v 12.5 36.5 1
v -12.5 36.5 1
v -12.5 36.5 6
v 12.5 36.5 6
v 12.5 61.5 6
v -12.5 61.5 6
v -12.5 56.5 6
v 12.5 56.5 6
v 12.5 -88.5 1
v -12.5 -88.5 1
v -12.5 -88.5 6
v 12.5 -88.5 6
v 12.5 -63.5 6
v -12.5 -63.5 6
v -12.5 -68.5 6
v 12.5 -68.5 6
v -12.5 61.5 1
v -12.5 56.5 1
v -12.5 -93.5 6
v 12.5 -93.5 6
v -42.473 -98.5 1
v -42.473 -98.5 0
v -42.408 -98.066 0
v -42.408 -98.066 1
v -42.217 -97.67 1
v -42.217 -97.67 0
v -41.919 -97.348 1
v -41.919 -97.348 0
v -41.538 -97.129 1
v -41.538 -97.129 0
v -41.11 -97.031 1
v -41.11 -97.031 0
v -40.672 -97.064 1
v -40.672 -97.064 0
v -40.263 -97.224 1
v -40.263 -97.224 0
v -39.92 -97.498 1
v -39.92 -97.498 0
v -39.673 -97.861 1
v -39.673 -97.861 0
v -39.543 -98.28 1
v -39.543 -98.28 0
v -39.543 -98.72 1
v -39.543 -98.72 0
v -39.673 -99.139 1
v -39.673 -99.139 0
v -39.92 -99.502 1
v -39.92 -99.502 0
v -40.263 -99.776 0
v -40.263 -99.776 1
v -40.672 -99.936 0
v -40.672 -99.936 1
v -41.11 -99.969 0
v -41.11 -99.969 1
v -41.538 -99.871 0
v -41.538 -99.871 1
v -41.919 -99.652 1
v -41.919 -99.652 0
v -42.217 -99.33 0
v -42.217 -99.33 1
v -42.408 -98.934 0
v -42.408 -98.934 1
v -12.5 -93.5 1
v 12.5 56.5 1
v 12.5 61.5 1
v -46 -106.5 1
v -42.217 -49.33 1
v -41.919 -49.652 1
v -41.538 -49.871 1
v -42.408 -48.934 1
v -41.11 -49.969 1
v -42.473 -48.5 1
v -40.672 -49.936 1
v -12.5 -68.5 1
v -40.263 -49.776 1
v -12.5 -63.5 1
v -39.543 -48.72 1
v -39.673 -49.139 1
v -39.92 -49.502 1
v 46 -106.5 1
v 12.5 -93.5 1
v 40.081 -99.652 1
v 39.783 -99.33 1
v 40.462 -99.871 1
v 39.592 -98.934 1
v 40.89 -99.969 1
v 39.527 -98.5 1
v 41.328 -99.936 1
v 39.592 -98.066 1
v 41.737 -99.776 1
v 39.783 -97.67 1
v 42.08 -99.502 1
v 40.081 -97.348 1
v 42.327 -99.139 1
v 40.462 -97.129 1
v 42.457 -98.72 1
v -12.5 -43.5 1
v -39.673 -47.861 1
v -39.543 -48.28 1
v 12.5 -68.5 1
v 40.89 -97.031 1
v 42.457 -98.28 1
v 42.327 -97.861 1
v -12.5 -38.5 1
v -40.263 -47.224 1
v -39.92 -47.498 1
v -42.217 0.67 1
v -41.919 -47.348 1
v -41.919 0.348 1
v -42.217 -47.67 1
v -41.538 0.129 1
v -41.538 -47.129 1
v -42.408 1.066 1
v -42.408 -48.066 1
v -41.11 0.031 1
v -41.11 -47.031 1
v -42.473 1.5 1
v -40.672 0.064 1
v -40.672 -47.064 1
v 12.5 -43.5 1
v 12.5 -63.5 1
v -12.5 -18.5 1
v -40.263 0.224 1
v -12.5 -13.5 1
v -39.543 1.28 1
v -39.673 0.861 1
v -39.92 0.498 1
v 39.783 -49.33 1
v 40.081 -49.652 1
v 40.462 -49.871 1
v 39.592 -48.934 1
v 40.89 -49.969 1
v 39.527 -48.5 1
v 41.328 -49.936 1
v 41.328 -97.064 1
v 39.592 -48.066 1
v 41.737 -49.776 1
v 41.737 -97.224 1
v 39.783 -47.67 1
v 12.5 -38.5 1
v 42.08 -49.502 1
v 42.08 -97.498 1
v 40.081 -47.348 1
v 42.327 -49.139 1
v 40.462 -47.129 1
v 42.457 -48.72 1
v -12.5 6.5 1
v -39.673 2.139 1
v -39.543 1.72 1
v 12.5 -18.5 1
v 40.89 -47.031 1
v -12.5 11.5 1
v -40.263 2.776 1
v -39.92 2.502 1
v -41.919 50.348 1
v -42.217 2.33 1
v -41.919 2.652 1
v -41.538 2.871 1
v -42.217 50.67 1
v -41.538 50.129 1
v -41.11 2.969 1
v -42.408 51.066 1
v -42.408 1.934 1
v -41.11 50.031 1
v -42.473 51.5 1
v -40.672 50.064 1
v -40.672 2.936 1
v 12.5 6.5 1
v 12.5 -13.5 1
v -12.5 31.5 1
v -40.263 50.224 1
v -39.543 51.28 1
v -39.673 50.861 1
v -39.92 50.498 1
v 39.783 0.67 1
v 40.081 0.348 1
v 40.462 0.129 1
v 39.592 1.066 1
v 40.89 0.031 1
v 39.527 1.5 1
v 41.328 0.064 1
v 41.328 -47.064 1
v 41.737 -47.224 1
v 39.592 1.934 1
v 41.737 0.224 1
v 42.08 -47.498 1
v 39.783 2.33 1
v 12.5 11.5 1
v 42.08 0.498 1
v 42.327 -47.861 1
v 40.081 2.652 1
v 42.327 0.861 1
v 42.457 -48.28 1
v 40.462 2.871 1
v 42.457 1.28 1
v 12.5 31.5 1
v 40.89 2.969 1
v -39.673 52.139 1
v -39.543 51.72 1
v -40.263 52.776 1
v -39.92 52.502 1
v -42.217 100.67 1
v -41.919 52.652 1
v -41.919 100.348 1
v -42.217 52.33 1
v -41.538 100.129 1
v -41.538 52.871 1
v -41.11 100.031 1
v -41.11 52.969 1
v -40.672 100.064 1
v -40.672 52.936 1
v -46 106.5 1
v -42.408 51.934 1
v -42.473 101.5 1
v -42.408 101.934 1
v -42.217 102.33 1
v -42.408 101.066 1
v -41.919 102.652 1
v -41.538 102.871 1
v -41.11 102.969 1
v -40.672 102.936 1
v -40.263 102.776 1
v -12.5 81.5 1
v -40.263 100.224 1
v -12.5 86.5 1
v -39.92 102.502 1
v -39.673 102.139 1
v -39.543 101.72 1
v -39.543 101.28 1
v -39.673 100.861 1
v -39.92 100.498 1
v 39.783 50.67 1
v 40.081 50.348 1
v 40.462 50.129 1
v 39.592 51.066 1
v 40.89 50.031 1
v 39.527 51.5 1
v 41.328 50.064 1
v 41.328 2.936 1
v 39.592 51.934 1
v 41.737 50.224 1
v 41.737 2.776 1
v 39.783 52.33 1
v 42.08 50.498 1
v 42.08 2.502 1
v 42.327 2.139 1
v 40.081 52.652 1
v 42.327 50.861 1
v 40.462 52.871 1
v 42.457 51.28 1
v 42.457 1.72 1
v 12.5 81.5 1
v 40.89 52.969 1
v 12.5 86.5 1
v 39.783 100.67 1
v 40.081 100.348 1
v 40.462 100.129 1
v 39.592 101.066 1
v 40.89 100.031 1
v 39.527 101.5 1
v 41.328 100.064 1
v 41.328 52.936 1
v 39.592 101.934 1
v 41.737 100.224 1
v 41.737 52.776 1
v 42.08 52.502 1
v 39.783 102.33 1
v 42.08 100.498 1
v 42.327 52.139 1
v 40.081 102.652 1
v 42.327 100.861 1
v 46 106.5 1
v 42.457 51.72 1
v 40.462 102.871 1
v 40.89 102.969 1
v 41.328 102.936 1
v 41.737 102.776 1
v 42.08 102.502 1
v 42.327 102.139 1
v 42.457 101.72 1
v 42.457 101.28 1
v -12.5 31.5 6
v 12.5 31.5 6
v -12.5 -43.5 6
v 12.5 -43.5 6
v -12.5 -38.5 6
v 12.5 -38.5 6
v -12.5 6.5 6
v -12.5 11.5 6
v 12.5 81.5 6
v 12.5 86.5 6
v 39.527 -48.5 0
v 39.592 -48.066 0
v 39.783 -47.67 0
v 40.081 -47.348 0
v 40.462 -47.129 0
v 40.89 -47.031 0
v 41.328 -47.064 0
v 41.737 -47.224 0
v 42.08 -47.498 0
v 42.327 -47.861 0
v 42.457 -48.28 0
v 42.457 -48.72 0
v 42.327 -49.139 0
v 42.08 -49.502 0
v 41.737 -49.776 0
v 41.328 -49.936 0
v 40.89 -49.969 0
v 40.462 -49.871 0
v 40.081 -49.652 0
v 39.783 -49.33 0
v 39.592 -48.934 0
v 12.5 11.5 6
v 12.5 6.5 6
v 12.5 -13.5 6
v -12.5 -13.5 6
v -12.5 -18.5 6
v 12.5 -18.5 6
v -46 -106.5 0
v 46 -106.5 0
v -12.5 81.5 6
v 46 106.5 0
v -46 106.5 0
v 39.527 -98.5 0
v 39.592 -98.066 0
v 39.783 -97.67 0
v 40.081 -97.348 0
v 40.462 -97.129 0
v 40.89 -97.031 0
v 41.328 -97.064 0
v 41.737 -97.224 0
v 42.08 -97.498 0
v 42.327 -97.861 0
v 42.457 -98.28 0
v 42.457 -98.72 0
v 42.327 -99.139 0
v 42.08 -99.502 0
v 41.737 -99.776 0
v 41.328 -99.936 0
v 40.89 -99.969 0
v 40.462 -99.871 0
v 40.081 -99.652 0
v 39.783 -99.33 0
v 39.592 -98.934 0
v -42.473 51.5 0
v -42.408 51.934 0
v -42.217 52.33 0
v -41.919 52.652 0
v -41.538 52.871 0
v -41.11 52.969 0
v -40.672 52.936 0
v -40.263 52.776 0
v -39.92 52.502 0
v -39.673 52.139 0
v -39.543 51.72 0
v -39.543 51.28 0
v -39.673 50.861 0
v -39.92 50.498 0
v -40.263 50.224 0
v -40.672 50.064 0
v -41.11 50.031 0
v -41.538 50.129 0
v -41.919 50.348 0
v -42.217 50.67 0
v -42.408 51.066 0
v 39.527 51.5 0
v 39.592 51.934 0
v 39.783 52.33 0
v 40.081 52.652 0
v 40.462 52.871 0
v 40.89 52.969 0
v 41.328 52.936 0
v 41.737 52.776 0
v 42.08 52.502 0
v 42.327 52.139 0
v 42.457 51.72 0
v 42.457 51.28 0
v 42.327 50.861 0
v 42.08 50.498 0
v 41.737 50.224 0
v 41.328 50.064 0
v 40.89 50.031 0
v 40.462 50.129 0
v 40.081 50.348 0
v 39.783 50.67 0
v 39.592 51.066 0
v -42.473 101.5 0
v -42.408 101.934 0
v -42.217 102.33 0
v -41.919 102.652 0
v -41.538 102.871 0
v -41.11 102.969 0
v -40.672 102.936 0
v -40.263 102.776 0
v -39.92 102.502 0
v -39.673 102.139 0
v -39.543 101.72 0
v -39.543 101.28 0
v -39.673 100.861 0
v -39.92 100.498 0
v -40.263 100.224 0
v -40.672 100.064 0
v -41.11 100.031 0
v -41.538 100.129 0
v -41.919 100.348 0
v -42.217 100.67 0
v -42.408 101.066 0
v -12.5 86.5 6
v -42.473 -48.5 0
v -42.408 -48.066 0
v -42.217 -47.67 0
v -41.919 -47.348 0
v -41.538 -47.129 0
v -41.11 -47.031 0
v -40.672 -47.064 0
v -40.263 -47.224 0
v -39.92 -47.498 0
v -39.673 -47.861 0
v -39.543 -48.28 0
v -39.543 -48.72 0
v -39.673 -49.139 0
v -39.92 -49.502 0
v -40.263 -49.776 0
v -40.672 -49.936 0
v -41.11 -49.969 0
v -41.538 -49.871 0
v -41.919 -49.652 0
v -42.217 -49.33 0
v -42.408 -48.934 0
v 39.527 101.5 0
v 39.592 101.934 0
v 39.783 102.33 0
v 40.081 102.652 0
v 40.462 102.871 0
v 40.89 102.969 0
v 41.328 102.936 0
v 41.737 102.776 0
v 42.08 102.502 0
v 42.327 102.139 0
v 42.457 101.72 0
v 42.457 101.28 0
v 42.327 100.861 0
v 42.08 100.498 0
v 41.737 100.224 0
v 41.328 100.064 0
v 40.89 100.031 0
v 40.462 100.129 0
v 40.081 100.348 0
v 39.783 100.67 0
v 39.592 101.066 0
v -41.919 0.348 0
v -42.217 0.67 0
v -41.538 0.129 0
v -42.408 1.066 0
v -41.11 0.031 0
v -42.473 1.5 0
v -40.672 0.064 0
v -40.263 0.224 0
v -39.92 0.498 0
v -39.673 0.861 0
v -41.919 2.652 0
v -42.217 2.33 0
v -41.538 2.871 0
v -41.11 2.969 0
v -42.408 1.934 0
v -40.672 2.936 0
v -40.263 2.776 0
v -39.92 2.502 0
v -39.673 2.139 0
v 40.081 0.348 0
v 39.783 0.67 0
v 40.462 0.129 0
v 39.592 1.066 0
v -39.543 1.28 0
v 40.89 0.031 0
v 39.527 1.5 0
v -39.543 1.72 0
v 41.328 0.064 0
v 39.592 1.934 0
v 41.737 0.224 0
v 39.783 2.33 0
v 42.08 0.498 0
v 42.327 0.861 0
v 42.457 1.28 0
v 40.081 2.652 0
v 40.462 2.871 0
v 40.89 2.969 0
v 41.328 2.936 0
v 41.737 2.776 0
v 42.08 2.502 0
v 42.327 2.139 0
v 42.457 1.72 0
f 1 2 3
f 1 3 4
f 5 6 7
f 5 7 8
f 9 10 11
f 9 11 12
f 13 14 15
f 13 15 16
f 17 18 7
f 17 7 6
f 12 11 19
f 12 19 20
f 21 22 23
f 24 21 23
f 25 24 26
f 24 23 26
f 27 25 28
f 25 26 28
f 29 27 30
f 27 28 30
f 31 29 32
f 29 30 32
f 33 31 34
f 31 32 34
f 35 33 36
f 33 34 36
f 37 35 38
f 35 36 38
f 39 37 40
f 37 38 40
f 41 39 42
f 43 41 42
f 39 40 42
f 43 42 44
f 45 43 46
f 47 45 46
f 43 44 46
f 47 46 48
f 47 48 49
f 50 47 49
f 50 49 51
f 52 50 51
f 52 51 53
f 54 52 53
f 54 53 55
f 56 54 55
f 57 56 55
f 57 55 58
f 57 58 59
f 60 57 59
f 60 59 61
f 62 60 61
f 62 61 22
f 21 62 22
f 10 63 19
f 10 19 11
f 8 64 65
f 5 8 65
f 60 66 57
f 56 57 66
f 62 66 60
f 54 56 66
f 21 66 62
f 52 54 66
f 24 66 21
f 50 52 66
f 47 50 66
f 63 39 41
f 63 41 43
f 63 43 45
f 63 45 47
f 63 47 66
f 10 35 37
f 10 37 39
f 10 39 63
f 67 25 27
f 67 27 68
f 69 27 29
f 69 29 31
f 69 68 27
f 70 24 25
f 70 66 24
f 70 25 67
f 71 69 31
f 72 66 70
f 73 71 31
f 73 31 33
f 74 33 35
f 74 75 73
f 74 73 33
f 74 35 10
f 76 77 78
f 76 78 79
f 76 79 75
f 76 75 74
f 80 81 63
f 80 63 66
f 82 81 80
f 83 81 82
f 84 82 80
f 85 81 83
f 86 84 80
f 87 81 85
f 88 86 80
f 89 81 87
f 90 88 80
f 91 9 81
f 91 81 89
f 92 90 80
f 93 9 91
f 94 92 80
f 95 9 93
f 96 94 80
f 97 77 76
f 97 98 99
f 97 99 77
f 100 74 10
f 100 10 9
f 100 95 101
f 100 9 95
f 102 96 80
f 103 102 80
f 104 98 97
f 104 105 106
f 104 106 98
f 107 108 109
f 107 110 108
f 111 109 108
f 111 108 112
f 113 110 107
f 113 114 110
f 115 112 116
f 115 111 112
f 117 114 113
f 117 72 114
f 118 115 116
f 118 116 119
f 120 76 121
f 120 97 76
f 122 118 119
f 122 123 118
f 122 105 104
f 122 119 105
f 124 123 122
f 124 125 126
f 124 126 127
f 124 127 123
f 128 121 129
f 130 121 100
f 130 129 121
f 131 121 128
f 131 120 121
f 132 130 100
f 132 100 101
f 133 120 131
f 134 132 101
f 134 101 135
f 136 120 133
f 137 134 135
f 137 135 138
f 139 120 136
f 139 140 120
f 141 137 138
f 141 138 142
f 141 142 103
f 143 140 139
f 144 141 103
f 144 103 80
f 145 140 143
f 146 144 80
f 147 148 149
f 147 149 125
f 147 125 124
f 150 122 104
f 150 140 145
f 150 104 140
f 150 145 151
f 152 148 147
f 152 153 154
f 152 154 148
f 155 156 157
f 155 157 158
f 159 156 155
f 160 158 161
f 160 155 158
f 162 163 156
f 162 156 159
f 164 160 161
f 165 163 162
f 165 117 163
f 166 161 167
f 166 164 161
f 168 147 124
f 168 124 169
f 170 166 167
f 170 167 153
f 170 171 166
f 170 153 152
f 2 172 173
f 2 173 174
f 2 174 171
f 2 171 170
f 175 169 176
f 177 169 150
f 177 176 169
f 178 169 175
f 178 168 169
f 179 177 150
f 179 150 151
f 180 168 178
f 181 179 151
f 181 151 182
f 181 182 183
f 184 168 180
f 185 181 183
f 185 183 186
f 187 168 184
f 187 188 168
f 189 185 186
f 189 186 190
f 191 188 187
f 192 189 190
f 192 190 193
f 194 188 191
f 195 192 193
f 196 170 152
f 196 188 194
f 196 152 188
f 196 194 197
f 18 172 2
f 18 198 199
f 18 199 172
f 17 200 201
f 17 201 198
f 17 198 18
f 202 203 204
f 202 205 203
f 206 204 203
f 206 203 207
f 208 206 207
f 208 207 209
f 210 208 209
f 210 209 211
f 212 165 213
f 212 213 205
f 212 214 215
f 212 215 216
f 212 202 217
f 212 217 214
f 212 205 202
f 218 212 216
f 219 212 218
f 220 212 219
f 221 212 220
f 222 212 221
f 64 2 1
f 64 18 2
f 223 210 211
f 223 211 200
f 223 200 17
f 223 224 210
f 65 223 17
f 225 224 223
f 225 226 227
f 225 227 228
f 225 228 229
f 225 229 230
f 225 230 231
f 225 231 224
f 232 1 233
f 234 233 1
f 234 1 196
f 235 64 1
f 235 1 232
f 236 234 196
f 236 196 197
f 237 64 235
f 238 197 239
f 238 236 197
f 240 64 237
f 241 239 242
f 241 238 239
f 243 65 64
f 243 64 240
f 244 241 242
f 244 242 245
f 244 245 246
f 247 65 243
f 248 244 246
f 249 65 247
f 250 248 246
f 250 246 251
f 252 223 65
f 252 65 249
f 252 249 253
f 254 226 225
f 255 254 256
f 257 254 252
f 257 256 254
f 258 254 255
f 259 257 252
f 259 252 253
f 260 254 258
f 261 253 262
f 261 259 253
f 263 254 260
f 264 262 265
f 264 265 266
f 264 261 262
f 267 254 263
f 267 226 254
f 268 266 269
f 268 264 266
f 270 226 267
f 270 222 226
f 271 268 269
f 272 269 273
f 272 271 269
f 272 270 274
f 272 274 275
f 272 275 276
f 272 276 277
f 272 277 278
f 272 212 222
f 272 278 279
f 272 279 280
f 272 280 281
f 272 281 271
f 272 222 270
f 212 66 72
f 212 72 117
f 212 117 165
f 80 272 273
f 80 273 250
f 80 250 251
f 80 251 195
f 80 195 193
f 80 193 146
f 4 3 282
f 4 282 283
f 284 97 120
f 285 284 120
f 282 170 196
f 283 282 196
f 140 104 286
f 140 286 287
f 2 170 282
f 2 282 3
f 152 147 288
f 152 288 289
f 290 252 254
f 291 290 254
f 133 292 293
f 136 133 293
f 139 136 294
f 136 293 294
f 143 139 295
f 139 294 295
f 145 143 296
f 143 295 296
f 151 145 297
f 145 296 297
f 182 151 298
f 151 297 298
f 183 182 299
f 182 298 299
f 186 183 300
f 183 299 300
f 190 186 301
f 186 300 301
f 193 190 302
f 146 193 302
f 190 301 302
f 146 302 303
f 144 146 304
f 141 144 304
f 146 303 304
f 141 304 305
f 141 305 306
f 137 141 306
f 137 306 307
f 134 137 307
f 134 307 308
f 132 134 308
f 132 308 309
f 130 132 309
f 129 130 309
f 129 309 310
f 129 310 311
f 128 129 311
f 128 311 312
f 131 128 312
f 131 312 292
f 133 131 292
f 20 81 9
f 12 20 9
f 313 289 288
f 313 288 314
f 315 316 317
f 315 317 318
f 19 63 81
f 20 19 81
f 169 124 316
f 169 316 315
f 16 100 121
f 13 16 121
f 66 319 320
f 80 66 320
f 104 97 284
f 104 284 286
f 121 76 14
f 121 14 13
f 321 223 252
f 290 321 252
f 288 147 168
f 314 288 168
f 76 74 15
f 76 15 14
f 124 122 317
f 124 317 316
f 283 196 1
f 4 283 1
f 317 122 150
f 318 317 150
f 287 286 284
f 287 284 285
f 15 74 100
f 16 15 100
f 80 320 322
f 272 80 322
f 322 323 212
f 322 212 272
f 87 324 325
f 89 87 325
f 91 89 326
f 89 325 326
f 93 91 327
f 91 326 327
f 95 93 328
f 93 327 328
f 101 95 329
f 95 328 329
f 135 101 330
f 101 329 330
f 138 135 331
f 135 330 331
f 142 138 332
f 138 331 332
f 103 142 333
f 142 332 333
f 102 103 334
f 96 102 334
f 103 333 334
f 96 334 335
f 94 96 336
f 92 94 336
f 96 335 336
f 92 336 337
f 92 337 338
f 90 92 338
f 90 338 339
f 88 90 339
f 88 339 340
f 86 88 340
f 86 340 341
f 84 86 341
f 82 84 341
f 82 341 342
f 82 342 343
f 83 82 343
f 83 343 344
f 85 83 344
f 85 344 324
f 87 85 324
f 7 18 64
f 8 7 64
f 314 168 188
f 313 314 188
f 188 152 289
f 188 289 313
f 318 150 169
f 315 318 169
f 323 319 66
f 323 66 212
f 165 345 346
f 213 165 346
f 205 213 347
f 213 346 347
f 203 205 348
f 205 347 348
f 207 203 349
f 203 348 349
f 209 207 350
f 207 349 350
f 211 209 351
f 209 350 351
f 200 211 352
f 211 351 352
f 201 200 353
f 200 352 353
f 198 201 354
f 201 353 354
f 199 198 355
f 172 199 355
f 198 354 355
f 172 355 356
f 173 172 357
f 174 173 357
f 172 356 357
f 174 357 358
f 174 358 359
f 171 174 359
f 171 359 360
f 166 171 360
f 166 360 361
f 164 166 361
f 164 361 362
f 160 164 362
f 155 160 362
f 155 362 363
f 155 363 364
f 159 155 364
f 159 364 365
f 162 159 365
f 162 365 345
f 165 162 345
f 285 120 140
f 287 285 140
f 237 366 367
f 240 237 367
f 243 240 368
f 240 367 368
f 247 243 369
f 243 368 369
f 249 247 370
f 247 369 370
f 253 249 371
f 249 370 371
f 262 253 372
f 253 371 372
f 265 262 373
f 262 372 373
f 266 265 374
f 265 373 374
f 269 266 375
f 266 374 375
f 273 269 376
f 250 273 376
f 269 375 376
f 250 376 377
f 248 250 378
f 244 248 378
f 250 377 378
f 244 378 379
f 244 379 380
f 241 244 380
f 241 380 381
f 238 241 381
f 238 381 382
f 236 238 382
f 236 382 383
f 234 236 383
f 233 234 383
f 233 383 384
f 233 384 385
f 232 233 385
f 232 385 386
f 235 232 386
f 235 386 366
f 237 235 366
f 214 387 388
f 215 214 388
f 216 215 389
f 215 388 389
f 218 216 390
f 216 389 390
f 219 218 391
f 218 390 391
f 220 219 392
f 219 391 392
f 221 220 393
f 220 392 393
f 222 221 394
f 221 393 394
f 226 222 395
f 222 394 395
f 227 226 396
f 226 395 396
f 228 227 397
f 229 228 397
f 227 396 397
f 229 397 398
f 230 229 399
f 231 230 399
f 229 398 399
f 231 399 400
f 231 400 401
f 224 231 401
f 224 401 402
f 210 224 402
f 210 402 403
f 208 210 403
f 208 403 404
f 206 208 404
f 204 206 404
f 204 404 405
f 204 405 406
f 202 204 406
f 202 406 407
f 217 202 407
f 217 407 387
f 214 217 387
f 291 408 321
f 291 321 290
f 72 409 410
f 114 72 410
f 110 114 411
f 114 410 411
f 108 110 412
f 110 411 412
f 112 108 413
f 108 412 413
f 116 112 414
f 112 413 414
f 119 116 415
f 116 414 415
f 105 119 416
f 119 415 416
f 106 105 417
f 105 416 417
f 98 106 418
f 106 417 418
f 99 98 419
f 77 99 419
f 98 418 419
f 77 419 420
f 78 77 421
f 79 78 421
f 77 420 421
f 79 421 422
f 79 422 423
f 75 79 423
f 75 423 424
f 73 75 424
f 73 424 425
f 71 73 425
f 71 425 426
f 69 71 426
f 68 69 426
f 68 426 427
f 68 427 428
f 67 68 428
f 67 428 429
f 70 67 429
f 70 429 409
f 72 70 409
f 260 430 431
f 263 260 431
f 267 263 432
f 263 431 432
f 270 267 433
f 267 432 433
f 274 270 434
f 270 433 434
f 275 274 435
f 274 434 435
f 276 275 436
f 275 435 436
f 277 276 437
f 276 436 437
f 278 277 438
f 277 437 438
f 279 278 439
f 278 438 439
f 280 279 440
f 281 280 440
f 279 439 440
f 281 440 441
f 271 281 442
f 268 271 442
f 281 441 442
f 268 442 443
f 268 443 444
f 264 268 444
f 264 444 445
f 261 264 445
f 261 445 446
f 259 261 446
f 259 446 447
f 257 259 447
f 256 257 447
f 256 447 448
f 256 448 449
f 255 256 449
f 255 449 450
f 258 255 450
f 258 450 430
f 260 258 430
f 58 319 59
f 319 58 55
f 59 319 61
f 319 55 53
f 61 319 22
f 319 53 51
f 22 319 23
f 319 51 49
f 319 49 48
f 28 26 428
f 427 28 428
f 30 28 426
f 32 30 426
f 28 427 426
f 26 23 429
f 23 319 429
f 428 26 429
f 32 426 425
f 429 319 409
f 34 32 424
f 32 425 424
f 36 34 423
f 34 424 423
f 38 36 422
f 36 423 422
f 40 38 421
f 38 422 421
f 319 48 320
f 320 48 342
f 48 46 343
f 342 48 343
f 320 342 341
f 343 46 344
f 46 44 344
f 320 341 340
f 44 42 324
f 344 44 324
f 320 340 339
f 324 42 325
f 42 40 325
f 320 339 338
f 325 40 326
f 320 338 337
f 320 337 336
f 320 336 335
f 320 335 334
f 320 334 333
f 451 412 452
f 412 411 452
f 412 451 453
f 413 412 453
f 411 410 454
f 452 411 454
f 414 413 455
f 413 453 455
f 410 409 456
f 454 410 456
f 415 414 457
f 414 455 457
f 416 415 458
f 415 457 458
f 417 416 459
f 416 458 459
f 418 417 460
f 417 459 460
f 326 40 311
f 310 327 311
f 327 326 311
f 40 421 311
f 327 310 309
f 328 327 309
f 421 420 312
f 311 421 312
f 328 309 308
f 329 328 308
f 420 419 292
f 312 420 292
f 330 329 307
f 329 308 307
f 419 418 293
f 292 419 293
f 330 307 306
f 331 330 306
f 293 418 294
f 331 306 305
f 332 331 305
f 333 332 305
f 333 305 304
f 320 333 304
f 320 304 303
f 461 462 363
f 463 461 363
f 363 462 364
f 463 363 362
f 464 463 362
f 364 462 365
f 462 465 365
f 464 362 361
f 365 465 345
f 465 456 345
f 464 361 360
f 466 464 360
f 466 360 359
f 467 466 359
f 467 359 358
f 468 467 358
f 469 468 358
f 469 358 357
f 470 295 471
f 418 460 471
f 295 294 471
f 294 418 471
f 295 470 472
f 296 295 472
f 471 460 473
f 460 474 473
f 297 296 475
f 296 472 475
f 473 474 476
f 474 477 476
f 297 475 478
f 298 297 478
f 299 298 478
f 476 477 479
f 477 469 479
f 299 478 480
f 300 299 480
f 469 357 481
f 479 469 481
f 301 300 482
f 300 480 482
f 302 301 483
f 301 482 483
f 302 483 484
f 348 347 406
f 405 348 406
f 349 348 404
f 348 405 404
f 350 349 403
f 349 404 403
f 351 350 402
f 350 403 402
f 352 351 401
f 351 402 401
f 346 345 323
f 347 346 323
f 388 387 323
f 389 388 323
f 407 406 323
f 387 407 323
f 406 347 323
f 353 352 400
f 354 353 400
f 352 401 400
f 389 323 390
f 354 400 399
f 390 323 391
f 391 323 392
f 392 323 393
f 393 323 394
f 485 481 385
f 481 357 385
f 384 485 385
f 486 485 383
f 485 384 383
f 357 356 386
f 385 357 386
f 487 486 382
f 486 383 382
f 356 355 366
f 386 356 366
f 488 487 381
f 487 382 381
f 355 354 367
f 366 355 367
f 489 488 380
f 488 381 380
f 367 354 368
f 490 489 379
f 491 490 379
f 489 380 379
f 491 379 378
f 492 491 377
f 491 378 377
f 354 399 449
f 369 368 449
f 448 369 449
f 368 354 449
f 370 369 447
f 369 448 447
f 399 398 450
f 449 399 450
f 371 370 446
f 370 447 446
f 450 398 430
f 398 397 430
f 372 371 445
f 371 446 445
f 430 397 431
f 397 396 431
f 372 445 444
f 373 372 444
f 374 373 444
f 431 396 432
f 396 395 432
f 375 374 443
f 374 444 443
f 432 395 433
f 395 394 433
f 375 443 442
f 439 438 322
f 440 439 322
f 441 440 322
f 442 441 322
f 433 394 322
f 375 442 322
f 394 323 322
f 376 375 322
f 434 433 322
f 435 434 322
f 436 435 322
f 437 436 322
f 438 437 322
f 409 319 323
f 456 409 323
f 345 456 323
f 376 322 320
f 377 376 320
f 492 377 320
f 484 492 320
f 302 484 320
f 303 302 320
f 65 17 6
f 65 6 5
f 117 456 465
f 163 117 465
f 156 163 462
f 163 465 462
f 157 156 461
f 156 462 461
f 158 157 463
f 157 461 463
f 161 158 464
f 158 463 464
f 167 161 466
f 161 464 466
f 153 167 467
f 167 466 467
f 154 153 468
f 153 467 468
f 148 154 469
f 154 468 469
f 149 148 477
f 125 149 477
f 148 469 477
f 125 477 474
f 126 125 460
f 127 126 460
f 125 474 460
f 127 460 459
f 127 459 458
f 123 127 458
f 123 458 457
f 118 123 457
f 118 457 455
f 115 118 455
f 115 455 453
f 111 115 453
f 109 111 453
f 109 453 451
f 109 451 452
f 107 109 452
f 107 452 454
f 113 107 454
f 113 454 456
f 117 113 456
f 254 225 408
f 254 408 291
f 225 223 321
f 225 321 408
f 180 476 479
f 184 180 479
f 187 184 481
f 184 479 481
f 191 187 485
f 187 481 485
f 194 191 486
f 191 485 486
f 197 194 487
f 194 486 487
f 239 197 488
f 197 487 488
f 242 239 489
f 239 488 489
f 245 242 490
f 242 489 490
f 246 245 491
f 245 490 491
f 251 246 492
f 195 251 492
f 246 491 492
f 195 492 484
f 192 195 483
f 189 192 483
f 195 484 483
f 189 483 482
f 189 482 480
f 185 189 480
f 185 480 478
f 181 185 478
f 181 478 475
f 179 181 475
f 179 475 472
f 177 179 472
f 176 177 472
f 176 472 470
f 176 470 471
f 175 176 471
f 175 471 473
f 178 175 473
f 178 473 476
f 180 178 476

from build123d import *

# Parameters (mm, degrees)
SKETCH1_W                 = 92
SKETCH1_H                 = 213
BOSS_EXTRUDE1_DEPTH       = 1
SKETCH2_W                 = 25
SKETCH2_H                 = 5
BOSS_EXTRUDE2_DEPTH       = 5
F_4_CLEARANCE_HOLE1_D     = 2.9464
F_4_CLEARANCE_HOLE1_DEPTH = 3.175
F_4_CLEARANCE_HOLE1_TIP   = 0.885187864


with BuildPart() as part:
    # Sketch1 → Boss-Extrude1 (new body)
    with BuildSketch(Plane.XY):
        Rectangle(SKETCH1_W, SKETCH1_H)
    extrude(amount=BOSS_EXTRUDE1_DEPTH)

    # Sketch2 → Boss-Extrude2 (add)
    with BuildSketch(Plane.XY.offset(1)):
        with Locations((0, 84)):
            Rectangle(SKETCH2_W, SKETCH2_H)
        with Locations((0, 59)):
            Rectangle(SKETCH2_W, SKETCH2_H)
        with Locations((0, 34)):
            Rectangle(SKETCH2_W, SKETCH2_H)
        with Locations((0, 9)):
            Rectangle(SKETCH2_W, SKETCH2_H)
        with Locations((0, -16)):
            Rectangle(SKETCH2_W, SKETCH2_H)
        with Locations((0, -41)):
            Rectangle(SKETCH2_W, SKETCH2_H)
        with Locations((0, -66)):
            Rectangle(SKETCH2_W, SKETCH2_H)
        with Locations((0, -91)):
            Rectangle(SKETCH2_W, SKETCH2_H)
    extrude(amount=BOSS_EXTRUDE2_DEPTH)

    # #4 Clearance Hole1
    with Locations(Plane.XY.offset(1)):
        with Locations((-41, 101.5), (41, 101.5), (-41, 51.5), (41, 51.5), (-41, 1.5), (41, 1.5), (-41, -48.5), (41, -48.5), (-41, -98.5), (41, -98.5)):
            Hole(F_4_CLEARANCE_HOLE1_D / 2, depth=F_4_CLEARANCE_HOLE1_DEPTH)
            with Locations((0, 0, -(F_4_CLEARANCE_HOLE1_DEPTH + F_4_CLEARANCE_HOLE1_TIP / 2))):  # 118° drill point
                Cone(0, F_4_CLEARANCE_HOLE1_D / 2, F_4_CLEARANCE_HOLE1_TIP, mode=Mode.SUBTRACT)


solid = part.part
